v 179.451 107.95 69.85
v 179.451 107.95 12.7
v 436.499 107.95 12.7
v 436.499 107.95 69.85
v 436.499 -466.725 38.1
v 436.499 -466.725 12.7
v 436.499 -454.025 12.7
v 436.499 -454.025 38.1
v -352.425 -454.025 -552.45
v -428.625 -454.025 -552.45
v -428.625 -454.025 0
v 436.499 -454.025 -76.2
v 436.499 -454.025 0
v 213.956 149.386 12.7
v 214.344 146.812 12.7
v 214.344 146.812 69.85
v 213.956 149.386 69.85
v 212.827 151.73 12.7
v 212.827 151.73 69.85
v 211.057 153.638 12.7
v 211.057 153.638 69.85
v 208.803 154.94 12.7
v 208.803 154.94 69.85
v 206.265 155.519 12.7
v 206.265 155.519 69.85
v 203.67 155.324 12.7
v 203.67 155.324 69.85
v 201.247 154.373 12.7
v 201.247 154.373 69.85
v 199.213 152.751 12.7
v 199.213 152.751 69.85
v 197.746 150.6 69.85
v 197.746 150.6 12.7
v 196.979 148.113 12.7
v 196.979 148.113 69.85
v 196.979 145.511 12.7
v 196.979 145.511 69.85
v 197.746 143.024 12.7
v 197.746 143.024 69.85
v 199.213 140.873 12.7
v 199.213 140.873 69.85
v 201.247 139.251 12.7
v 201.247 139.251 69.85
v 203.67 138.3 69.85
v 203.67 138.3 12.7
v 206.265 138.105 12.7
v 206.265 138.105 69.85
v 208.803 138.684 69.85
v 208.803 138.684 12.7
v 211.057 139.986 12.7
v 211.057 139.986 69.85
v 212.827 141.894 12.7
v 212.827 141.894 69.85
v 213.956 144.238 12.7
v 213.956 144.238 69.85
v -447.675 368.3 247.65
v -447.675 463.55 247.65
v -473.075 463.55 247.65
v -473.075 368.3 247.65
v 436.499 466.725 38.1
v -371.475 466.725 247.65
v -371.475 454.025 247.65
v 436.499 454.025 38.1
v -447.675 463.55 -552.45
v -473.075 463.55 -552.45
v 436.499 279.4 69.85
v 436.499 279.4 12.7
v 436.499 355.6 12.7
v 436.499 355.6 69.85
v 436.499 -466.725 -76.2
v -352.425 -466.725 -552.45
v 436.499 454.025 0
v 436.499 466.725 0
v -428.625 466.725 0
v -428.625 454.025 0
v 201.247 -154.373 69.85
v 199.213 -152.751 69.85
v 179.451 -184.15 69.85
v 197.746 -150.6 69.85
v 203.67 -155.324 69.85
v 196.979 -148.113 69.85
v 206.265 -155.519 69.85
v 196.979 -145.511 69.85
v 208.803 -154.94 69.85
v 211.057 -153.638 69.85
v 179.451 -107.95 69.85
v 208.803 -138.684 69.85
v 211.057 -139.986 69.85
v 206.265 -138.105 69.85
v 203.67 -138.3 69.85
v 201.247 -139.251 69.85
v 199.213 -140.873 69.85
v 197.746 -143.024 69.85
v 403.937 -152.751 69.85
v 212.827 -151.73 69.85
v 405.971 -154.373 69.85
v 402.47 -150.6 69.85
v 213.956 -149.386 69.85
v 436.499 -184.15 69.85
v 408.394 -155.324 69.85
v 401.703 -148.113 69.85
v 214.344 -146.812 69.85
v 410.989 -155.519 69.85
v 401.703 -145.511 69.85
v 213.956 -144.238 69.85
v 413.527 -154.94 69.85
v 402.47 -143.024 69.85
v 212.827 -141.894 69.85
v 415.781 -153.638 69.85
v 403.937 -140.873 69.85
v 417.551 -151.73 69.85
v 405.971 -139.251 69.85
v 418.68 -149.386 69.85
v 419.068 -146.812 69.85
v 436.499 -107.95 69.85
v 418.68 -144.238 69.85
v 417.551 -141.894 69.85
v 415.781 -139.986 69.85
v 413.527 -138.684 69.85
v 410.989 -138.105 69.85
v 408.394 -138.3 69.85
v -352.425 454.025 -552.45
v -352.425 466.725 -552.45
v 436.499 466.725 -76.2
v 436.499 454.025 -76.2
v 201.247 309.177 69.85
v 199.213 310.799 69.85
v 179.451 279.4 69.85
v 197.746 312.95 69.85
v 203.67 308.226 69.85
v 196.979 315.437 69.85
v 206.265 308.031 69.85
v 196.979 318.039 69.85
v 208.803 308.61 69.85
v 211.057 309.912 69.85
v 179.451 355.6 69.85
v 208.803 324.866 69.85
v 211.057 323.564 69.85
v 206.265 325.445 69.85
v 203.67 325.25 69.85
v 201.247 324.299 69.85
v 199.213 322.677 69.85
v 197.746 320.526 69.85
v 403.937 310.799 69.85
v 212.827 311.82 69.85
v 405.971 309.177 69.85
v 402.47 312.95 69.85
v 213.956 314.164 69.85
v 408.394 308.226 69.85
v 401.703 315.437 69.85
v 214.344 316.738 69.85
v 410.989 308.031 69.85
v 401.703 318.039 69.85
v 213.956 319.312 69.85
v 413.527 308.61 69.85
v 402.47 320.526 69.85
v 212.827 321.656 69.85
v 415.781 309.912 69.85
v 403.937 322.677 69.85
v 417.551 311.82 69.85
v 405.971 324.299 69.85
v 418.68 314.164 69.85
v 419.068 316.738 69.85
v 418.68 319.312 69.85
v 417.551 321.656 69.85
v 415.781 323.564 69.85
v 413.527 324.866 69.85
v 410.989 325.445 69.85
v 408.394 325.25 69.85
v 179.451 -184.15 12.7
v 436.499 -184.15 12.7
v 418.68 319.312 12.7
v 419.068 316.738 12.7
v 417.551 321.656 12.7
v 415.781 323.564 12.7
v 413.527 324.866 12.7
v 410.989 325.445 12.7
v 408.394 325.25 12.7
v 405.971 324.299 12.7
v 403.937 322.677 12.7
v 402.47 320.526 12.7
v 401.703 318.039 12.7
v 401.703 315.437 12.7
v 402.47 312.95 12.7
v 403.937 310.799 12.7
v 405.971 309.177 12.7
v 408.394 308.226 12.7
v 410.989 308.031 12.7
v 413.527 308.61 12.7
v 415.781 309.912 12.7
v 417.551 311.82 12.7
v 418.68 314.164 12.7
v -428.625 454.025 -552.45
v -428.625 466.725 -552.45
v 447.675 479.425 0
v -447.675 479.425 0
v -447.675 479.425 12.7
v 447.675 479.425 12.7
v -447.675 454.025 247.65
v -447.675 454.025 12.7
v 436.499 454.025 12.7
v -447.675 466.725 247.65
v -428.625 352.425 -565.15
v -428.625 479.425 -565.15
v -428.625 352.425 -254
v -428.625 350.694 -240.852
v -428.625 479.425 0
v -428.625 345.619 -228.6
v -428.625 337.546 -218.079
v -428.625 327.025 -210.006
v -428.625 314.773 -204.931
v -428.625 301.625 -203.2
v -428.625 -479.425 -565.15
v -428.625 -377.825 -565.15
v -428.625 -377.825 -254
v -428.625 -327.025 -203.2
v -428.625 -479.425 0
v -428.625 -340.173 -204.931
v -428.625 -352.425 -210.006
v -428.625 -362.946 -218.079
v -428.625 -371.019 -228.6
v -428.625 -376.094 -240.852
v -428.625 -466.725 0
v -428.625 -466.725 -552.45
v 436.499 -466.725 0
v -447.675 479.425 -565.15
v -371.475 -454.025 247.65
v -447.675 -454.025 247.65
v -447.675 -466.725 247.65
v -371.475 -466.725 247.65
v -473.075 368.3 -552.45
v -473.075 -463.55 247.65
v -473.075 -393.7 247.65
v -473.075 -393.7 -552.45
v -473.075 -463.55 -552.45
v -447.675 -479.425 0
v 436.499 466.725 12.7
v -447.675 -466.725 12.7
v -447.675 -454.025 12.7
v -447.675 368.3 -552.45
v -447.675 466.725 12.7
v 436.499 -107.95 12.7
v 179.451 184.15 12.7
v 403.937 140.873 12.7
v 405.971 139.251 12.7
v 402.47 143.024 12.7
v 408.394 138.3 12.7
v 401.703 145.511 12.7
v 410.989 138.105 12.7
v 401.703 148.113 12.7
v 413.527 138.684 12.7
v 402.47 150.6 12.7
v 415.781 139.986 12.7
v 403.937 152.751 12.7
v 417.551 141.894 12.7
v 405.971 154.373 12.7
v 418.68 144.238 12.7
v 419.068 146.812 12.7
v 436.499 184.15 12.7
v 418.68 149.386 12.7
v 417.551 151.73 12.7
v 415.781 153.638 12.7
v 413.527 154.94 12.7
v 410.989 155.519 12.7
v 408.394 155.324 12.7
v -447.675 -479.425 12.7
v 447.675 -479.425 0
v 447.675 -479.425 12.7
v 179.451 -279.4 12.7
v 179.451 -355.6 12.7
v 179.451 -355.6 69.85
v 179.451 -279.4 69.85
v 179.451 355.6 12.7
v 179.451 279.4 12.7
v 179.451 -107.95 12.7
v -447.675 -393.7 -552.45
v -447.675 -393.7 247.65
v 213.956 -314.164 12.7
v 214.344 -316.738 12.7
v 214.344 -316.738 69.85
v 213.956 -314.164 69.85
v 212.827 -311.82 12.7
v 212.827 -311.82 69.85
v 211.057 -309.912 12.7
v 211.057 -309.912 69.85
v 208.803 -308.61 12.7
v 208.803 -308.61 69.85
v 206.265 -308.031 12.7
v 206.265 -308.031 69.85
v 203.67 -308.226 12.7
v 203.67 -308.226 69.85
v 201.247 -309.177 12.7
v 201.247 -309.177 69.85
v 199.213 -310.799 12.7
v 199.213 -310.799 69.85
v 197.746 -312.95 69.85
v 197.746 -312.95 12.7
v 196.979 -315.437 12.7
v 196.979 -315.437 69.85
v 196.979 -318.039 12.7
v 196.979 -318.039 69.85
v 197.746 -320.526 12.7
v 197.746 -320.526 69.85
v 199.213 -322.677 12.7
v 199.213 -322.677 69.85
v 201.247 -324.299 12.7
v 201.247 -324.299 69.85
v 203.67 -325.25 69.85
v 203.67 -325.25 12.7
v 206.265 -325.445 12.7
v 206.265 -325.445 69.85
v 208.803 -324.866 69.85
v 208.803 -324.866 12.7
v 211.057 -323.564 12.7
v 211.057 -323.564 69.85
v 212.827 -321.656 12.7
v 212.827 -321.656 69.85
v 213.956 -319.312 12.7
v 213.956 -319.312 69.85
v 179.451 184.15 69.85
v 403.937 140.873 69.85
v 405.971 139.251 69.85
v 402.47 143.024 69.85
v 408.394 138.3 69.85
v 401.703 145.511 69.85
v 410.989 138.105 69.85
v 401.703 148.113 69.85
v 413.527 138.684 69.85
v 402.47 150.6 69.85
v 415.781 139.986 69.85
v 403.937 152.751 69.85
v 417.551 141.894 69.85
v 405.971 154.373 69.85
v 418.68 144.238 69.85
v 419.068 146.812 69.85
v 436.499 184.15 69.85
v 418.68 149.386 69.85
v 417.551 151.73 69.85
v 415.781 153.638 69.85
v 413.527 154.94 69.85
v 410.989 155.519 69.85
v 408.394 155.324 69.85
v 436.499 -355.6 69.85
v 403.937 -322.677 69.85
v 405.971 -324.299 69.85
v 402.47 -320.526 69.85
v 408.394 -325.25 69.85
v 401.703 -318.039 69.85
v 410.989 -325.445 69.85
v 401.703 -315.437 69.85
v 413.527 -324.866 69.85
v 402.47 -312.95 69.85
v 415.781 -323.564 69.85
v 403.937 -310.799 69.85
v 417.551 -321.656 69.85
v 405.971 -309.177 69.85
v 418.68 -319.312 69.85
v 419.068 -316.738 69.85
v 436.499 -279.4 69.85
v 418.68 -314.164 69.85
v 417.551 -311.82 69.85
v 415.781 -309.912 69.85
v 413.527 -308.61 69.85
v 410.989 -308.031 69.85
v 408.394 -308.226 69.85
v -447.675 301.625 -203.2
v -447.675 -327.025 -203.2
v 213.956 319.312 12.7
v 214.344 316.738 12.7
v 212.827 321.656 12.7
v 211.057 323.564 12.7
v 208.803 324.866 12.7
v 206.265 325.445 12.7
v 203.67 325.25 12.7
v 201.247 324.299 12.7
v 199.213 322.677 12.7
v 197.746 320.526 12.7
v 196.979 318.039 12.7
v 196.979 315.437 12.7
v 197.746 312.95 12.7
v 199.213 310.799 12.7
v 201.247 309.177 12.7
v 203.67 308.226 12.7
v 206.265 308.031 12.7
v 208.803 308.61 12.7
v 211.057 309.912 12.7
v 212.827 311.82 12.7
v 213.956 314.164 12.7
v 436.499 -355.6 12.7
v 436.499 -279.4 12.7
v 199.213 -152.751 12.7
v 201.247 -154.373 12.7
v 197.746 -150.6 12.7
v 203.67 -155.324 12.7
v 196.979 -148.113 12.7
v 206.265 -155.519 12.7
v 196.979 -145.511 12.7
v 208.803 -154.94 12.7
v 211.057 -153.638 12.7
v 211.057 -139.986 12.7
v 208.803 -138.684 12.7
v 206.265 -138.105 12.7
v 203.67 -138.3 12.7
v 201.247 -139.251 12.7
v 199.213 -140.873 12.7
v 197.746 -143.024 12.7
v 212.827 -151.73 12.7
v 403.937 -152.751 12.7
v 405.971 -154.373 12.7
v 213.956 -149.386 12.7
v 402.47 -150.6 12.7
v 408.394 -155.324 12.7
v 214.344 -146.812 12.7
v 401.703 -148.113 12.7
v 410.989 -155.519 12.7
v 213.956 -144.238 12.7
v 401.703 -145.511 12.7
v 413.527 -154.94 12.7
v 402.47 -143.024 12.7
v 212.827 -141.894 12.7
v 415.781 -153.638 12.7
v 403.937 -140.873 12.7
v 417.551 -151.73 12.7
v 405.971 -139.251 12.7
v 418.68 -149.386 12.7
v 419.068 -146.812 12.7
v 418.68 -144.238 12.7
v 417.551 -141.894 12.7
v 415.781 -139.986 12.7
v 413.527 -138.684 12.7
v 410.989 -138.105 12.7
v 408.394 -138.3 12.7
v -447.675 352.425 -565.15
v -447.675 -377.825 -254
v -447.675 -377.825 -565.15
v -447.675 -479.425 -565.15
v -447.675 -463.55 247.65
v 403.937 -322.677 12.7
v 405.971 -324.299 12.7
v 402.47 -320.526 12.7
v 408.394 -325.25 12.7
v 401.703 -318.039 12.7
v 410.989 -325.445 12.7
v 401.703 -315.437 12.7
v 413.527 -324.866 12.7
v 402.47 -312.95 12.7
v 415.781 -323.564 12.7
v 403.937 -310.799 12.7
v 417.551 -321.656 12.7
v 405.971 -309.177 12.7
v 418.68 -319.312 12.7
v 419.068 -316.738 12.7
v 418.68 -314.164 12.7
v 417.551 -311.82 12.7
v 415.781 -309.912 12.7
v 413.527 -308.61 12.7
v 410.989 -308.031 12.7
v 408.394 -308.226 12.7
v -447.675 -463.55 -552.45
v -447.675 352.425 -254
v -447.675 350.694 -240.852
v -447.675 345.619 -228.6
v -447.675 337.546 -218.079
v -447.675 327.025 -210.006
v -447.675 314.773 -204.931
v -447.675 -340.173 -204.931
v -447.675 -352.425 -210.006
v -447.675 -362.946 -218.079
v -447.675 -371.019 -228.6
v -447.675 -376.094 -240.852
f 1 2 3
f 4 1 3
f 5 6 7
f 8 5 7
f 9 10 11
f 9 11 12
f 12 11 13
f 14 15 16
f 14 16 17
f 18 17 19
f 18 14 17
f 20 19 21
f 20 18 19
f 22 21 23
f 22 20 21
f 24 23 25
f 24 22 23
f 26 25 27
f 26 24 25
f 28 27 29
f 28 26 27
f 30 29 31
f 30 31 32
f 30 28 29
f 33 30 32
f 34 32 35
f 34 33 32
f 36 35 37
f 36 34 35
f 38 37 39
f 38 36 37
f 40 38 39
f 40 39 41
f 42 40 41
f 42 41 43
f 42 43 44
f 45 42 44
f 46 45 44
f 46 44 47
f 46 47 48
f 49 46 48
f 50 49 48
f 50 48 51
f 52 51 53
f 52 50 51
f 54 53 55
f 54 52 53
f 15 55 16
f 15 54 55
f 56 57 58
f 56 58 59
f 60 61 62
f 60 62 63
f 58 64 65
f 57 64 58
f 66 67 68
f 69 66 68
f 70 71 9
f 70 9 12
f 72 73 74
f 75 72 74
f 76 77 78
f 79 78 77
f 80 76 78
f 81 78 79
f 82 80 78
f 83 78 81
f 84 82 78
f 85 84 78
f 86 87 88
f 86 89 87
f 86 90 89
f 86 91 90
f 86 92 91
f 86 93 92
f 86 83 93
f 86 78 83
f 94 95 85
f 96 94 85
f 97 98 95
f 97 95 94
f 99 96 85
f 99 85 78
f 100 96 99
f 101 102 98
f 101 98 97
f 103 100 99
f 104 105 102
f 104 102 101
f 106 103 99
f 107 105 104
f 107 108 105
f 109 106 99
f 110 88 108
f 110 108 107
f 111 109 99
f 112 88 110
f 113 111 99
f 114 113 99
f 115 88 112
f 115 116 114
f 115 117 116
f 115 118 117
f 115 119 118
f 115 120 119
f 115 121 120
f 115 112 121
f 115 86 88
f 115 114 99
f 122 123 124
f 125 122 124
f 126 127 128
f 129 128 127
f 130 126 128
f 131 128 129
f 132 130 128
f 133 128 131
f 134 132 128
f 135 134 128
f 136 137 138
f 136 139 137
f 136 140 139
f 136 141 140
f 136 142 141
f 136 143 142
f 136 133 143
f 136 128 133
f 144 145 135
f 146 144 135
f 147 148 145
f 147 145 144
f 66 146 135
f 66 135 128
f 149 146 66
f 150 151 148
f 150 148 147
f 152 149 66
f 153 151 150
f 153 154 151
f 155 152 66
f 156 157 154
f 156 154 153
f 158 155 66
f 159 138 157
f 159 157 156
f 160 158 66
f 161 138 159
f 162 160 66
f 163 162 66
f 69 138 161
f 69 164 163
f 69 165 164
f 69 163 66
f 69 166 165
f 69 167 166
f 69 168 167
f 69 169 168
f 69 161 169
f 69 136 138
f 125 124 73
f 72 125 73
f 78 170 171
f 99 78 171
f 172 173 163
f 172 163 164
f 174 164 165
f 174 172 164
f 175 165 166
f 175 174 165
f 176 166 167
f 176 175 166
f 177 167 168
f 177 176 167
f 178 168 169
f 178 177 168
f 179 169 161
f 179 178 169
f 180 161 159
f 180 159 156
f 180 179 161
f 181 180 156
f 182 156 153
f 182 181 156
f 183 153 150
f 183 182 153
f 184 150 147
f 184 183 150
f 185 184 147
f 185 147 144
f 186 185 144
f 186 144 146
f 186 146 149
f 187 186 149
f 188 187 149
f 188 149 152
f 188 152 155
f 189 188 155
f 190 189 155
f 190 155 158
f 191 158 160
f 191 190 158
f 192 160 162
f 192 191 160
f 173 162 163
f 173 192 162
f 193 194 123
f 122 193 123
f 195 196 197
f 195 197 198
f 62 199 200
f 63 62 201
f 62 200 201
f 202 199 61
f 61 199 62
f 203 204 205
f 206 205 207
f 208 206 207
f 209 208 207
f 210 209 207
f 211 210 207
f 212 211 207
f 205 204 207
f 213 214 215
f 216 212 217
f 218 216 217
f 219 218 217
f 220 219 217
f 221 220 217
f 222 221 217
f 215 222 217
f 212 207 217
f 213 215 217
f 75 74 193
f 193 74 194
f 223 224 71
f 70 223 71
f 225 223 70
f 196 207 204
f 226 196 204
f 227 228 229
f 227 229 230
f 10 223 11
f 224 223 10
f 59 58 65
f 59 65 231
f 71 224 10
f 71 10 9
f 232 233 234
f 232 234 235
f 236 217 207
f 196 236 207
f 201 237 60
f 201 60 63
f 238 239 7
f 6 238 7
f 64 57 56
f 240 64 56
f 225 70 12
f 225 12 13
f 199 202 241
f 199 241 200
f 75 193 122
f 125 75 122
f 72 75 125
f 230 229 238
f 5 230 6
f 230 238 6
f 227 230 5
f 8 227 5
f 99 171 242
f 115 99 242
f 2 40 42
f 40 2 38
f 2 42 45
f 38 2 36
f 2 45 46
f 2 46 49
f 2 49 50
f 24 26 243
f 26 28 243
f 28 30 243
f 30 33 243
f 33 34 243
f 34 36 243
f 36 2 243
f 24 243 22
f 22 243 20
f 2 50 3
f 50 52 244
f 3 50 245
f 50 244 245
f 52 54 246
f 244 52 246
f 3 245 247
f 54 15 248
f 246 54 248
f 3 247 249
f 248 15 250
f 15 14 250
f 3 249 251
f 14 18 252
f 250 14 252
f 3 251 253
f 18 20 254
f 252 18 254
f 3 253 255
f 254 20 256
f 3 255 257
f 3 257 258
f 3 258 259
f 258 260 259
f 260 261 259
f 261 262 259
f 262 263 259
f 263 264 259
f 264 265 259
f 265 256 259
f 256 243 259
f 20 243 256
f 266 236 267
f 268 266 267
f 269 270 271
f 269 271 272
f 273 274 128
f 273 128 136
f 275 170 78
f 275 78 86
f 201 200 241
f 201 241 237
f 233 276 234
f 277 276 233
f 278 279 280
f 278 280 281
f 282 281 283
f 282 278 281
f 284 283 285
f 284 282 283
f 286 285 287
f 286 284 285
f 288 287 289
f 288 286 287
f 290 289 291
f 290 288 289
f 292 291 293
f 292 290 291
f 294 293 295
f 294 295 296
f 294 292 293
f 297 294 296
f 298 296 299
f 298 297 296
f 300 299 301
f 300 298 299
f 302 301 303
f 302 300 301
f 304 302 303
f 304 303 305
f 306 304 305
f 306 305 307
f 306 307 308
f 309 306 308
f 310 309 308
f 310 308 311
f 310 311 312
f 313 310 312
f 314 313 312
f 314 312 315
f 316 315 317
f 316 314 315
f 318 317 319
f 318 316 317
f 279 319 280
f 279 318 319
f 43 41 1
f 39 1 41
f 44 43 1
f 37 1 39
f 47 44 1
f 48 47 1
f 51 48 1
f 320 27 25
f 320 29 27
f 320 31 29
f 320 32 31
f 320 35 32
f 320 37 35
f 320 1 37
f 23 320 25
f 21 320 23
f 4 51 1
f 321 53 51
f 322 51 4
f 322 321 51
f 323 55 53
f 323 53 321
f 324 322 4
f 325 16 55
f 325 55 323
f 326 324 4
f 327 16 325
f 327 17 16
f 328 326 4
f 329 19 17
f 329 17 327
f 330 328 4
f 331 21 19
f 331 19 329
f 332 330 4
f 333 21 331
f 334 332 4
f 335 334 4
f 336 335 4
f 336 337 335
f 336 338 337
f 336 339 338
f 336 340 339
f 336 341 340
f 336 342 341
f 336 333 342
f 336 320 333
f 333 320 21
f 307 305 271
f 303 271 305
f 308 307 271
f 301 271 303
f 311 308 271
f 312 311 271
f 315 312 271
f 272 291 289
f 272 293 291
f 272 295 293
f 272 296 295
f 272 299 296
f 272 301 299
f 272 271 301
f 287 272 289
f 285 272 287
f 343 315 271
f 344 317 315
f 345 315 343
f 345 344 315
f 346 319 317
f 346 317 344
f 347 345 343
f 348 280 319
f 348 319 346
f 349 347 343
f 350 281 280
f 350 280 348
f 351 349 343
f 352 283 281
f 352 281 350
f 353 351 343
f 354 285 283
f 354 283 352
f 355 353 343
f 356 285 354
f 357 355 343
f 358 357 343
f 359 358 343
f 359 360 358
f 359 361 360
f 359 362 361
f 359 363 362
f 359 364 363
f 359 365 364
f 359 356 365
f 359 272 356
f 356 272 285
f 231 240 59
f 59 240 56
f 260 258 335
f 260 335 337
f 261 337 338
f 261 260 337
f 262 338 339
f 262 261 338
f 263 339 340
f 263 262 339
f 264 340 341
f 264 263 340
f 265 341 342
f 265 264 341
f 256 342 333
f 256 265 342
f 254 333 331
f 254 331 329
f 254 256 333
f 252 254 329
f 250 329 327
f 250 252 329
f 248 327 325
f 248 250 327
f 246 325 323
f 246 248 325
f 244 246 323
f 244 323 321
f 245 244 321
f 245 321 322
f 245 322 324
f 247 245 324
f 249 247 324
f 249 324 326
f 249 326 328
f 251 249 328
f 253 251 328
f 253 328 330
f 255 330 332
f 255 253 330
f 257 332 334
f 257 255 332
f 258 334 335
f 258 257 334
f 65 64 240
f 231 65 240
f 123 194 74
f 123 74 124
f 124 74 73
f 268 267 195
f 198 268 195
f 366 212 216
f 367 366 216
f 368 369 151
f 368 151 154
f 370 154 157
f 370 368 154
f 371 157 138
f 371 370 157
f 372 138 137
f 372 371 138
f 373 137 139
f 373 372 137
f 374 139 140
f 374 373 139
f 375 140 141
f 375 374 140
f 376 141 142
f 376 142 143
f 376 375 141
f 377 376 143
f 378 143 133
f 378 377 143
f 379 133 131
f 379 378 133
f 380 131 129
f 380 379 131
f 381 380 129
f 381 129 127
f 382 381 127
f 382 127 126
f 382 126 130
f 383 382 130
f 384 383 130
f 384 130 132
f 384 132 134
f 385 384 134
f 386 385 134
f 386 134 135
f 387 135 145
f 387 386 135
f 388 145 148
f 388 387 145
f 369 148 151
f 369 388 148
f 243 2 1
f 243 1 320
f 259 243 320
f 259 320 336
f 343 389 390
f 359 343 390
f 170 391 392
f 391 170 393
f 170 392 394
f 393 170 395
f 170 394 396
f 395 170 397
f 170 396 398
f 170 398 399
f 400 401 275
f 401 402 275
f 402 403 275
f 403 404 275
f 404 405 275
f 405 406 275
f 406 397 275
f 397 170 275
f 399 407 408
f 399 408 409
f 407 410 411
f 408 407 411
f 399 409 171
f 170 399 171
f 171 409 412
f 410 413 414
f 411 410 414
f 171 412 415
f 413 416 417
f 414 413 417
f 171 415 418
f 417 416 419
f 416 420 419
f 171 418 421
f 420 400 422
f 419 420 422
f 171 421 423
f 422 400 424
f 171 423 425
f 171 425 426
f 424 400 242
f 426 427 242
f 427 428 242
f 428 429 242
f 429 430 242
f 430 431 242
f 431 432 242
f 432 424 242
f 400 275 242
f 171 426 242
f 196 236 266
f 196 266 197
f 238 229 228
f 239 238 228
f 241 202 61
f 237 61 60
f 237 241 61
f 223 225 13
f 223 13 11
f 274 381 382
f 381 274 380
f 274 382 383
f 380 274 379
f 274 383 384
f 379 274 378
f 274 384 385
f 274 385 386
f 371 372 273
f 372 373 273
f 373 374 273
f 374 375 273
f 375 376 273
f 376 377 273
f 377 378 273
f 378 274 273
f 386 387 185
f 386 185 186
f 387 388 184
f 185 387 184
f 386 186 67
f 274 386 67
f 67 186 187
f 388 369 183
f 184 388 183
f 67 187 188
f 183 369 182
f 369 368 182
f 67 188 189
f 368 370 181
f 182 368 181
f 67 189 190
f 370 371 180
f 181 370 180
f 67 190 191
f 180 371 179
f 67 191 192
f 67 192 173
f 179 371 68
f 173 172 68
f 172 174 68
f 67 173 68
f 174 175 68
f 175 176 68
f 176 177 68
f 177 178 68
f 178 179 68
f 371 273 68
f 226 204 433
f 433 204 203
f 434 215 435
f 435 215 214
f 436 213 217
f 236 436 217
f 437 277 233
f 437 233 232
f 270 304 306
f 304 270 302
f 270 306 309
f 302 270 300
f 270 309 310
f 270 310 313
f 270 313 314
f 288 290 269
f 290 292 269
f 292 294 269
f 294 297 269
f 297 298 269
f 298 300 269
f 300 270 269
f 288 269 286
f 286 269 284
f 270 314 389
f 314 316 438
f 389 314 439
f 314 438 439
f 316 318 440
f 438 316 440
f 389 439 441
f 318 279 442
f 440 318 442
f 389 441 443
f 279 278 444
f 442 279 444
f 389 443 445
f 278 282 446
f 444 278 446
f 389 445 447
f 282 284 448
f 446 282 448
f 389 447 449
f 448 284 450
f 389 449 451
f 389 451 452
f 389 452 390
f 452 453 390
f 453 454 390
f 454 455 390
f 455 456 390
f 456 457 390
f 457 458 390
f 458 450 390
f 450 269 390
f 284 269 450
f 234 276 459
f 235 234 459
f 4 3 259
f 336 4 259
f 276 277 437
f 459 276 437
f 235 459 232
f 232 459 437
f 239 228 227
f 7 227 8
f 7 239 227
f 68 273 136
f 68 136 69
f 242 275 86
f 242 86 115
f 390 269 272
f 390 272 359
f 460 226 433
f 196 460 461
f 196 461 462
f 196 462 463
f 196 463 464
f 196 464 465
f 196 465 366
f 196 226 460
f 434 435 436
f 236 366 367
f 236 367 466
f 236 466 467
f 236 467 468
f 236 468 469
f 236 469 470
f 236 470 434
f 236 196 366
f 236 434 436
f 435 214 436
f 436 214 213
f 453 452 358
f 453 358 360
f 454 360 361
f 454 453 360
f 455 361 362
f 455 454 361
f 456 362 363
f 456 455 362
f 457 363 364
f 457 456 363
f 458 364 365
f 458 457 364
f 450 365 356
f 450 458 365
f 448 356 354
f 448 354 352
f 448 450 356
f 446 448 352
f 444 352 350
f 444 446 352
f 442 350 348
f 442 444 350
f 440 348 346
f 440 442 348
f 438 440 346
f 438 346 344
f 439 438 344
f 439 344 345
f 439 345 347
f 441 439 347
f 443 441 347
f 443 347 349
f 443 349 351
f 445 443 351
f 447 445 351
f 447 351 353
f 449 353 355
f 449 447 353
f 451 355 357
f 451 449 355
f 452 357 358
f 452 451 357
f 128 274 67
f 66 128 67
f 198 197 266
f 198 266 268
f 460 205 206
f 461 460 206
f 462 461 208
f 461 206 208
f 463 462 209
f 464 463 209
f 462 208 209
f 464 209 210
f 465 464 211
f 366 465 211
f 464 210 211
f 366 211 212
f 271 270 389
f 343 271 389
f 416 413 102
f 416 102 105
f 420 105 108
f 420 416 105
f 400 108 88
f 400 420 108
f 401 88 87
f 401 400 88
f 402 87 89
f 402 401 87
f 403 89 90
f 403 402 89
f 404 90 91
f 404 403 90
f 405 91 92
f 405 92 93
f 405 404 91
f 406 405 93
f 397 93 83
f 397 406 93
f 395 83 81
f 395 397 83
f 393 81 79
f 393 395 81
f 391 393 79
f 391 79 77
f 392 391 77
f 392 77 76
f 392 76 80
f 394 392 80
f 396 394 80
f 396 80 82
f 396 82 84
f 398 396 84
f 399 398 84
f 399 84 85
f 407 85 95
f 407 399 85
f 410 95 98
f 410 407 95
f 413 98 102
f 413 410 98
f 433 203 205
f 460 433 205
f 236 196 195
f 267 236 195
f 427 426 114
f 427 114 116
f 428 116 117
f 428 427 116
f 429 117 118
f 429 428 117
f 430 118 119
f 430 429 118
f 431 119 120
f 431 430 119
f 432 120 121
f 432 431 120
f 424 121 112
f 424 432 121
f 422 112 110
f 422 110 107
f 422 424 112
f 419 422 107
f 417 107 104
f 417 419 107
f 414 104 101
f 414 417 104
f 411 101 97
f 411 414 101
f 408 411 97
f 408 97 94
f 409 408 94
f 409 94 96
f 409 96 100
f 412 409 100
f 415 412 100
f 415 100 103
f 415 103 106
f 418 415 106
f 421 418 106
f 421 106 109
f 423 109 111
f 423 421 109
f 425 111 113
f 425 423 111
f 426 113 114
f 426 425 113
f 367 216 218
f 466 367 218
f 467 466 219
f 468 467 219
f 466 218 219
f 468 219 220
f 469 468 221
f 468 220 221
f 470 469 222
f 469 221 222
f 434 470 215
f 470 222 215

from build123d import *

# Parameters (mm, degrees)
F0_W      = 895.35
F0_H      = 958.85
F1_DEPTH  = 12.7
F2_W      = 884.174
F2_H      = 12.7
F3_DEPTH  = 234.95
F5_DEPTH  = 946.151
F8_DEPTH  = 12.7
F11_DEPTH = 19.05
F12_W     = 95.25
F12_H     = 800.1
F12_W_2   = 69.85
F13_DEPTH = 25.4
F14_W     = 257.048
F14_H     = 76.2
F14_R     = 8.73125
F15_DEPTH = 57.15


with BuildPart() as f1:
    # F0 (on Top) → F1 (new body)
    with BuildSketch(Plane.XY):
        Rectangle(F0_W, F0_H)
    extrude(amount=F1_DEPTH)


with BuildPart() as f3:
    # F2 (on face) → F3 (new body)
    with BuildSketch(Plane.XY.offset(12.7)):
        with Locations((-5.588, -460.375)):
            Rectangle(F2_W, F2_H)
    extrude(amount=F3_DEPTH)

    # F4 (on face) → F5 (cut, through all)
    with BuildSketch(Plane.XZ.offset(466.725)):
        Polygon((436.499, 247.65), (-371.475, 247.65), (436.499, 38.1), align=None)
    extrude(amount=-F5_DEPTH, mode=Mode.SUBTRACT)


with BuildPart() as f6_1:
    # F6: instance of F3
    add(f3.part.mirror(Plane.XZ))


with BuildPart() as f8:
    # F7 (on face) → F8 (new body)
    with BuildSketch(Plane.XZ.offset(466.725)):
        Polygon((-428.625, 0), (-428.625, -552.45), (-352.425, -552.45), (436.499, -76.2), (436.499, 0), align=None)
    extrude(amount=-F8_DEPTH)


with BuildPart() as f9_1:
    # F9: instance of F8
    add(f8.part.mirror(Plane.XZ))


with BuildPart() as f11:
    # F10 (on face) → F11 (new body)
    with BuildSketch(Plane(origin=(-428.625, 0, 0), x_dir=(0, -1, 0), z_dir=(-1, 0, 0))):
        with BuildLine():
            Line((479.425, -565.15), (479.425, 0))
            Line((479.425, 0), (-479.425, 0))
            Line((-479.425, 0), (-479.425, -565.15))
            Line((-479.425, -565.15), (-352.425, -565.15))
            Line((-352.425, -565.15), (-352.425, -254))
            ThreePointArc((-352.425, -254), (-337.546024, -218.078976), (-301.625, -203.2))
            Line((-301.625, -203.2), (327.025, -203.2))
            ThreePointArc((327.025, -203.2), (362.946024, -218.078976), (377.825, -254))
            Line((377.825, -254), (377.825, -565.15))
            Line((377.825, -565.15), (479.425, -565.15))
        make_face()
    extrude(amount=F11_DEPTH)


with BuildPart() as f13:
    # F12 (on face) → F13 (new body)
    with BuildSketch(Plane(origin=(-447.675, 0, 0), x_dir=(0, -1, 0), z_dir=(-1, 0, 0))):
        with Locations((-415.925, -152.4)):
            Rectangle(F12_W, F12_H)
        with Locations((428.625, -152.4)):
            Rectangle(F12_W_2, F12_H)
    extrude(amount=F13_DEPTH)


with BuildPart() as f15:
    # F14 (on face) → F15 (new body)
    with BuildSketch(Plane.XY.offset(12.7)):
        with Locations((307.975, -146.05)):
            Rectangle(F14_W, F14_H)
        with Locations((205.613, -146.812)):
            Circle(F14_R, mode=Mode.SUBTRACT)
        with Locations((410.337, -146.812)):
            Circle(F14_R, mode=Mode.SUBTRACT)
        with Locations((307.975, -317.5)):
            Rectangle(F14_W, F14_H)
        with Locations((205.613, -316.738)):
            Circle(F14_R, mode=Mode.SUBTRACT)
        with Locations((410.337, -316.738)):
            Circle(F14_R, mode=Mode.SUBTRACT)
        with Locations((307.975, 146.05)):
            Rectangle(F14_W, F14_H)
        with Locations((205.613, 146.812)):
            Circle(F14_R, mode=Mode.SUBTRACT)
        with Locations((410.337, 146.812)):
            Circle(F14_R, mode=Mode.SUBTRACT)
        with Locations((307.975, 317.5)):
            Rectangle(F14_W, F14_H)
        with Locations((205.613, 316.738)):
            Circle(F14_R, mode=Mode.SUBTRACT)
        with Locations((410.337, 316.738)):
            Circle(F14_R, mode=Mode.SUBTRACT)
    extrude(amount=F15_DEPTH)


solid = Compound([f1.part, f3.part, f6_1.part, f8.part, f9_1.part, f11.part, f13.part, f15.part])
